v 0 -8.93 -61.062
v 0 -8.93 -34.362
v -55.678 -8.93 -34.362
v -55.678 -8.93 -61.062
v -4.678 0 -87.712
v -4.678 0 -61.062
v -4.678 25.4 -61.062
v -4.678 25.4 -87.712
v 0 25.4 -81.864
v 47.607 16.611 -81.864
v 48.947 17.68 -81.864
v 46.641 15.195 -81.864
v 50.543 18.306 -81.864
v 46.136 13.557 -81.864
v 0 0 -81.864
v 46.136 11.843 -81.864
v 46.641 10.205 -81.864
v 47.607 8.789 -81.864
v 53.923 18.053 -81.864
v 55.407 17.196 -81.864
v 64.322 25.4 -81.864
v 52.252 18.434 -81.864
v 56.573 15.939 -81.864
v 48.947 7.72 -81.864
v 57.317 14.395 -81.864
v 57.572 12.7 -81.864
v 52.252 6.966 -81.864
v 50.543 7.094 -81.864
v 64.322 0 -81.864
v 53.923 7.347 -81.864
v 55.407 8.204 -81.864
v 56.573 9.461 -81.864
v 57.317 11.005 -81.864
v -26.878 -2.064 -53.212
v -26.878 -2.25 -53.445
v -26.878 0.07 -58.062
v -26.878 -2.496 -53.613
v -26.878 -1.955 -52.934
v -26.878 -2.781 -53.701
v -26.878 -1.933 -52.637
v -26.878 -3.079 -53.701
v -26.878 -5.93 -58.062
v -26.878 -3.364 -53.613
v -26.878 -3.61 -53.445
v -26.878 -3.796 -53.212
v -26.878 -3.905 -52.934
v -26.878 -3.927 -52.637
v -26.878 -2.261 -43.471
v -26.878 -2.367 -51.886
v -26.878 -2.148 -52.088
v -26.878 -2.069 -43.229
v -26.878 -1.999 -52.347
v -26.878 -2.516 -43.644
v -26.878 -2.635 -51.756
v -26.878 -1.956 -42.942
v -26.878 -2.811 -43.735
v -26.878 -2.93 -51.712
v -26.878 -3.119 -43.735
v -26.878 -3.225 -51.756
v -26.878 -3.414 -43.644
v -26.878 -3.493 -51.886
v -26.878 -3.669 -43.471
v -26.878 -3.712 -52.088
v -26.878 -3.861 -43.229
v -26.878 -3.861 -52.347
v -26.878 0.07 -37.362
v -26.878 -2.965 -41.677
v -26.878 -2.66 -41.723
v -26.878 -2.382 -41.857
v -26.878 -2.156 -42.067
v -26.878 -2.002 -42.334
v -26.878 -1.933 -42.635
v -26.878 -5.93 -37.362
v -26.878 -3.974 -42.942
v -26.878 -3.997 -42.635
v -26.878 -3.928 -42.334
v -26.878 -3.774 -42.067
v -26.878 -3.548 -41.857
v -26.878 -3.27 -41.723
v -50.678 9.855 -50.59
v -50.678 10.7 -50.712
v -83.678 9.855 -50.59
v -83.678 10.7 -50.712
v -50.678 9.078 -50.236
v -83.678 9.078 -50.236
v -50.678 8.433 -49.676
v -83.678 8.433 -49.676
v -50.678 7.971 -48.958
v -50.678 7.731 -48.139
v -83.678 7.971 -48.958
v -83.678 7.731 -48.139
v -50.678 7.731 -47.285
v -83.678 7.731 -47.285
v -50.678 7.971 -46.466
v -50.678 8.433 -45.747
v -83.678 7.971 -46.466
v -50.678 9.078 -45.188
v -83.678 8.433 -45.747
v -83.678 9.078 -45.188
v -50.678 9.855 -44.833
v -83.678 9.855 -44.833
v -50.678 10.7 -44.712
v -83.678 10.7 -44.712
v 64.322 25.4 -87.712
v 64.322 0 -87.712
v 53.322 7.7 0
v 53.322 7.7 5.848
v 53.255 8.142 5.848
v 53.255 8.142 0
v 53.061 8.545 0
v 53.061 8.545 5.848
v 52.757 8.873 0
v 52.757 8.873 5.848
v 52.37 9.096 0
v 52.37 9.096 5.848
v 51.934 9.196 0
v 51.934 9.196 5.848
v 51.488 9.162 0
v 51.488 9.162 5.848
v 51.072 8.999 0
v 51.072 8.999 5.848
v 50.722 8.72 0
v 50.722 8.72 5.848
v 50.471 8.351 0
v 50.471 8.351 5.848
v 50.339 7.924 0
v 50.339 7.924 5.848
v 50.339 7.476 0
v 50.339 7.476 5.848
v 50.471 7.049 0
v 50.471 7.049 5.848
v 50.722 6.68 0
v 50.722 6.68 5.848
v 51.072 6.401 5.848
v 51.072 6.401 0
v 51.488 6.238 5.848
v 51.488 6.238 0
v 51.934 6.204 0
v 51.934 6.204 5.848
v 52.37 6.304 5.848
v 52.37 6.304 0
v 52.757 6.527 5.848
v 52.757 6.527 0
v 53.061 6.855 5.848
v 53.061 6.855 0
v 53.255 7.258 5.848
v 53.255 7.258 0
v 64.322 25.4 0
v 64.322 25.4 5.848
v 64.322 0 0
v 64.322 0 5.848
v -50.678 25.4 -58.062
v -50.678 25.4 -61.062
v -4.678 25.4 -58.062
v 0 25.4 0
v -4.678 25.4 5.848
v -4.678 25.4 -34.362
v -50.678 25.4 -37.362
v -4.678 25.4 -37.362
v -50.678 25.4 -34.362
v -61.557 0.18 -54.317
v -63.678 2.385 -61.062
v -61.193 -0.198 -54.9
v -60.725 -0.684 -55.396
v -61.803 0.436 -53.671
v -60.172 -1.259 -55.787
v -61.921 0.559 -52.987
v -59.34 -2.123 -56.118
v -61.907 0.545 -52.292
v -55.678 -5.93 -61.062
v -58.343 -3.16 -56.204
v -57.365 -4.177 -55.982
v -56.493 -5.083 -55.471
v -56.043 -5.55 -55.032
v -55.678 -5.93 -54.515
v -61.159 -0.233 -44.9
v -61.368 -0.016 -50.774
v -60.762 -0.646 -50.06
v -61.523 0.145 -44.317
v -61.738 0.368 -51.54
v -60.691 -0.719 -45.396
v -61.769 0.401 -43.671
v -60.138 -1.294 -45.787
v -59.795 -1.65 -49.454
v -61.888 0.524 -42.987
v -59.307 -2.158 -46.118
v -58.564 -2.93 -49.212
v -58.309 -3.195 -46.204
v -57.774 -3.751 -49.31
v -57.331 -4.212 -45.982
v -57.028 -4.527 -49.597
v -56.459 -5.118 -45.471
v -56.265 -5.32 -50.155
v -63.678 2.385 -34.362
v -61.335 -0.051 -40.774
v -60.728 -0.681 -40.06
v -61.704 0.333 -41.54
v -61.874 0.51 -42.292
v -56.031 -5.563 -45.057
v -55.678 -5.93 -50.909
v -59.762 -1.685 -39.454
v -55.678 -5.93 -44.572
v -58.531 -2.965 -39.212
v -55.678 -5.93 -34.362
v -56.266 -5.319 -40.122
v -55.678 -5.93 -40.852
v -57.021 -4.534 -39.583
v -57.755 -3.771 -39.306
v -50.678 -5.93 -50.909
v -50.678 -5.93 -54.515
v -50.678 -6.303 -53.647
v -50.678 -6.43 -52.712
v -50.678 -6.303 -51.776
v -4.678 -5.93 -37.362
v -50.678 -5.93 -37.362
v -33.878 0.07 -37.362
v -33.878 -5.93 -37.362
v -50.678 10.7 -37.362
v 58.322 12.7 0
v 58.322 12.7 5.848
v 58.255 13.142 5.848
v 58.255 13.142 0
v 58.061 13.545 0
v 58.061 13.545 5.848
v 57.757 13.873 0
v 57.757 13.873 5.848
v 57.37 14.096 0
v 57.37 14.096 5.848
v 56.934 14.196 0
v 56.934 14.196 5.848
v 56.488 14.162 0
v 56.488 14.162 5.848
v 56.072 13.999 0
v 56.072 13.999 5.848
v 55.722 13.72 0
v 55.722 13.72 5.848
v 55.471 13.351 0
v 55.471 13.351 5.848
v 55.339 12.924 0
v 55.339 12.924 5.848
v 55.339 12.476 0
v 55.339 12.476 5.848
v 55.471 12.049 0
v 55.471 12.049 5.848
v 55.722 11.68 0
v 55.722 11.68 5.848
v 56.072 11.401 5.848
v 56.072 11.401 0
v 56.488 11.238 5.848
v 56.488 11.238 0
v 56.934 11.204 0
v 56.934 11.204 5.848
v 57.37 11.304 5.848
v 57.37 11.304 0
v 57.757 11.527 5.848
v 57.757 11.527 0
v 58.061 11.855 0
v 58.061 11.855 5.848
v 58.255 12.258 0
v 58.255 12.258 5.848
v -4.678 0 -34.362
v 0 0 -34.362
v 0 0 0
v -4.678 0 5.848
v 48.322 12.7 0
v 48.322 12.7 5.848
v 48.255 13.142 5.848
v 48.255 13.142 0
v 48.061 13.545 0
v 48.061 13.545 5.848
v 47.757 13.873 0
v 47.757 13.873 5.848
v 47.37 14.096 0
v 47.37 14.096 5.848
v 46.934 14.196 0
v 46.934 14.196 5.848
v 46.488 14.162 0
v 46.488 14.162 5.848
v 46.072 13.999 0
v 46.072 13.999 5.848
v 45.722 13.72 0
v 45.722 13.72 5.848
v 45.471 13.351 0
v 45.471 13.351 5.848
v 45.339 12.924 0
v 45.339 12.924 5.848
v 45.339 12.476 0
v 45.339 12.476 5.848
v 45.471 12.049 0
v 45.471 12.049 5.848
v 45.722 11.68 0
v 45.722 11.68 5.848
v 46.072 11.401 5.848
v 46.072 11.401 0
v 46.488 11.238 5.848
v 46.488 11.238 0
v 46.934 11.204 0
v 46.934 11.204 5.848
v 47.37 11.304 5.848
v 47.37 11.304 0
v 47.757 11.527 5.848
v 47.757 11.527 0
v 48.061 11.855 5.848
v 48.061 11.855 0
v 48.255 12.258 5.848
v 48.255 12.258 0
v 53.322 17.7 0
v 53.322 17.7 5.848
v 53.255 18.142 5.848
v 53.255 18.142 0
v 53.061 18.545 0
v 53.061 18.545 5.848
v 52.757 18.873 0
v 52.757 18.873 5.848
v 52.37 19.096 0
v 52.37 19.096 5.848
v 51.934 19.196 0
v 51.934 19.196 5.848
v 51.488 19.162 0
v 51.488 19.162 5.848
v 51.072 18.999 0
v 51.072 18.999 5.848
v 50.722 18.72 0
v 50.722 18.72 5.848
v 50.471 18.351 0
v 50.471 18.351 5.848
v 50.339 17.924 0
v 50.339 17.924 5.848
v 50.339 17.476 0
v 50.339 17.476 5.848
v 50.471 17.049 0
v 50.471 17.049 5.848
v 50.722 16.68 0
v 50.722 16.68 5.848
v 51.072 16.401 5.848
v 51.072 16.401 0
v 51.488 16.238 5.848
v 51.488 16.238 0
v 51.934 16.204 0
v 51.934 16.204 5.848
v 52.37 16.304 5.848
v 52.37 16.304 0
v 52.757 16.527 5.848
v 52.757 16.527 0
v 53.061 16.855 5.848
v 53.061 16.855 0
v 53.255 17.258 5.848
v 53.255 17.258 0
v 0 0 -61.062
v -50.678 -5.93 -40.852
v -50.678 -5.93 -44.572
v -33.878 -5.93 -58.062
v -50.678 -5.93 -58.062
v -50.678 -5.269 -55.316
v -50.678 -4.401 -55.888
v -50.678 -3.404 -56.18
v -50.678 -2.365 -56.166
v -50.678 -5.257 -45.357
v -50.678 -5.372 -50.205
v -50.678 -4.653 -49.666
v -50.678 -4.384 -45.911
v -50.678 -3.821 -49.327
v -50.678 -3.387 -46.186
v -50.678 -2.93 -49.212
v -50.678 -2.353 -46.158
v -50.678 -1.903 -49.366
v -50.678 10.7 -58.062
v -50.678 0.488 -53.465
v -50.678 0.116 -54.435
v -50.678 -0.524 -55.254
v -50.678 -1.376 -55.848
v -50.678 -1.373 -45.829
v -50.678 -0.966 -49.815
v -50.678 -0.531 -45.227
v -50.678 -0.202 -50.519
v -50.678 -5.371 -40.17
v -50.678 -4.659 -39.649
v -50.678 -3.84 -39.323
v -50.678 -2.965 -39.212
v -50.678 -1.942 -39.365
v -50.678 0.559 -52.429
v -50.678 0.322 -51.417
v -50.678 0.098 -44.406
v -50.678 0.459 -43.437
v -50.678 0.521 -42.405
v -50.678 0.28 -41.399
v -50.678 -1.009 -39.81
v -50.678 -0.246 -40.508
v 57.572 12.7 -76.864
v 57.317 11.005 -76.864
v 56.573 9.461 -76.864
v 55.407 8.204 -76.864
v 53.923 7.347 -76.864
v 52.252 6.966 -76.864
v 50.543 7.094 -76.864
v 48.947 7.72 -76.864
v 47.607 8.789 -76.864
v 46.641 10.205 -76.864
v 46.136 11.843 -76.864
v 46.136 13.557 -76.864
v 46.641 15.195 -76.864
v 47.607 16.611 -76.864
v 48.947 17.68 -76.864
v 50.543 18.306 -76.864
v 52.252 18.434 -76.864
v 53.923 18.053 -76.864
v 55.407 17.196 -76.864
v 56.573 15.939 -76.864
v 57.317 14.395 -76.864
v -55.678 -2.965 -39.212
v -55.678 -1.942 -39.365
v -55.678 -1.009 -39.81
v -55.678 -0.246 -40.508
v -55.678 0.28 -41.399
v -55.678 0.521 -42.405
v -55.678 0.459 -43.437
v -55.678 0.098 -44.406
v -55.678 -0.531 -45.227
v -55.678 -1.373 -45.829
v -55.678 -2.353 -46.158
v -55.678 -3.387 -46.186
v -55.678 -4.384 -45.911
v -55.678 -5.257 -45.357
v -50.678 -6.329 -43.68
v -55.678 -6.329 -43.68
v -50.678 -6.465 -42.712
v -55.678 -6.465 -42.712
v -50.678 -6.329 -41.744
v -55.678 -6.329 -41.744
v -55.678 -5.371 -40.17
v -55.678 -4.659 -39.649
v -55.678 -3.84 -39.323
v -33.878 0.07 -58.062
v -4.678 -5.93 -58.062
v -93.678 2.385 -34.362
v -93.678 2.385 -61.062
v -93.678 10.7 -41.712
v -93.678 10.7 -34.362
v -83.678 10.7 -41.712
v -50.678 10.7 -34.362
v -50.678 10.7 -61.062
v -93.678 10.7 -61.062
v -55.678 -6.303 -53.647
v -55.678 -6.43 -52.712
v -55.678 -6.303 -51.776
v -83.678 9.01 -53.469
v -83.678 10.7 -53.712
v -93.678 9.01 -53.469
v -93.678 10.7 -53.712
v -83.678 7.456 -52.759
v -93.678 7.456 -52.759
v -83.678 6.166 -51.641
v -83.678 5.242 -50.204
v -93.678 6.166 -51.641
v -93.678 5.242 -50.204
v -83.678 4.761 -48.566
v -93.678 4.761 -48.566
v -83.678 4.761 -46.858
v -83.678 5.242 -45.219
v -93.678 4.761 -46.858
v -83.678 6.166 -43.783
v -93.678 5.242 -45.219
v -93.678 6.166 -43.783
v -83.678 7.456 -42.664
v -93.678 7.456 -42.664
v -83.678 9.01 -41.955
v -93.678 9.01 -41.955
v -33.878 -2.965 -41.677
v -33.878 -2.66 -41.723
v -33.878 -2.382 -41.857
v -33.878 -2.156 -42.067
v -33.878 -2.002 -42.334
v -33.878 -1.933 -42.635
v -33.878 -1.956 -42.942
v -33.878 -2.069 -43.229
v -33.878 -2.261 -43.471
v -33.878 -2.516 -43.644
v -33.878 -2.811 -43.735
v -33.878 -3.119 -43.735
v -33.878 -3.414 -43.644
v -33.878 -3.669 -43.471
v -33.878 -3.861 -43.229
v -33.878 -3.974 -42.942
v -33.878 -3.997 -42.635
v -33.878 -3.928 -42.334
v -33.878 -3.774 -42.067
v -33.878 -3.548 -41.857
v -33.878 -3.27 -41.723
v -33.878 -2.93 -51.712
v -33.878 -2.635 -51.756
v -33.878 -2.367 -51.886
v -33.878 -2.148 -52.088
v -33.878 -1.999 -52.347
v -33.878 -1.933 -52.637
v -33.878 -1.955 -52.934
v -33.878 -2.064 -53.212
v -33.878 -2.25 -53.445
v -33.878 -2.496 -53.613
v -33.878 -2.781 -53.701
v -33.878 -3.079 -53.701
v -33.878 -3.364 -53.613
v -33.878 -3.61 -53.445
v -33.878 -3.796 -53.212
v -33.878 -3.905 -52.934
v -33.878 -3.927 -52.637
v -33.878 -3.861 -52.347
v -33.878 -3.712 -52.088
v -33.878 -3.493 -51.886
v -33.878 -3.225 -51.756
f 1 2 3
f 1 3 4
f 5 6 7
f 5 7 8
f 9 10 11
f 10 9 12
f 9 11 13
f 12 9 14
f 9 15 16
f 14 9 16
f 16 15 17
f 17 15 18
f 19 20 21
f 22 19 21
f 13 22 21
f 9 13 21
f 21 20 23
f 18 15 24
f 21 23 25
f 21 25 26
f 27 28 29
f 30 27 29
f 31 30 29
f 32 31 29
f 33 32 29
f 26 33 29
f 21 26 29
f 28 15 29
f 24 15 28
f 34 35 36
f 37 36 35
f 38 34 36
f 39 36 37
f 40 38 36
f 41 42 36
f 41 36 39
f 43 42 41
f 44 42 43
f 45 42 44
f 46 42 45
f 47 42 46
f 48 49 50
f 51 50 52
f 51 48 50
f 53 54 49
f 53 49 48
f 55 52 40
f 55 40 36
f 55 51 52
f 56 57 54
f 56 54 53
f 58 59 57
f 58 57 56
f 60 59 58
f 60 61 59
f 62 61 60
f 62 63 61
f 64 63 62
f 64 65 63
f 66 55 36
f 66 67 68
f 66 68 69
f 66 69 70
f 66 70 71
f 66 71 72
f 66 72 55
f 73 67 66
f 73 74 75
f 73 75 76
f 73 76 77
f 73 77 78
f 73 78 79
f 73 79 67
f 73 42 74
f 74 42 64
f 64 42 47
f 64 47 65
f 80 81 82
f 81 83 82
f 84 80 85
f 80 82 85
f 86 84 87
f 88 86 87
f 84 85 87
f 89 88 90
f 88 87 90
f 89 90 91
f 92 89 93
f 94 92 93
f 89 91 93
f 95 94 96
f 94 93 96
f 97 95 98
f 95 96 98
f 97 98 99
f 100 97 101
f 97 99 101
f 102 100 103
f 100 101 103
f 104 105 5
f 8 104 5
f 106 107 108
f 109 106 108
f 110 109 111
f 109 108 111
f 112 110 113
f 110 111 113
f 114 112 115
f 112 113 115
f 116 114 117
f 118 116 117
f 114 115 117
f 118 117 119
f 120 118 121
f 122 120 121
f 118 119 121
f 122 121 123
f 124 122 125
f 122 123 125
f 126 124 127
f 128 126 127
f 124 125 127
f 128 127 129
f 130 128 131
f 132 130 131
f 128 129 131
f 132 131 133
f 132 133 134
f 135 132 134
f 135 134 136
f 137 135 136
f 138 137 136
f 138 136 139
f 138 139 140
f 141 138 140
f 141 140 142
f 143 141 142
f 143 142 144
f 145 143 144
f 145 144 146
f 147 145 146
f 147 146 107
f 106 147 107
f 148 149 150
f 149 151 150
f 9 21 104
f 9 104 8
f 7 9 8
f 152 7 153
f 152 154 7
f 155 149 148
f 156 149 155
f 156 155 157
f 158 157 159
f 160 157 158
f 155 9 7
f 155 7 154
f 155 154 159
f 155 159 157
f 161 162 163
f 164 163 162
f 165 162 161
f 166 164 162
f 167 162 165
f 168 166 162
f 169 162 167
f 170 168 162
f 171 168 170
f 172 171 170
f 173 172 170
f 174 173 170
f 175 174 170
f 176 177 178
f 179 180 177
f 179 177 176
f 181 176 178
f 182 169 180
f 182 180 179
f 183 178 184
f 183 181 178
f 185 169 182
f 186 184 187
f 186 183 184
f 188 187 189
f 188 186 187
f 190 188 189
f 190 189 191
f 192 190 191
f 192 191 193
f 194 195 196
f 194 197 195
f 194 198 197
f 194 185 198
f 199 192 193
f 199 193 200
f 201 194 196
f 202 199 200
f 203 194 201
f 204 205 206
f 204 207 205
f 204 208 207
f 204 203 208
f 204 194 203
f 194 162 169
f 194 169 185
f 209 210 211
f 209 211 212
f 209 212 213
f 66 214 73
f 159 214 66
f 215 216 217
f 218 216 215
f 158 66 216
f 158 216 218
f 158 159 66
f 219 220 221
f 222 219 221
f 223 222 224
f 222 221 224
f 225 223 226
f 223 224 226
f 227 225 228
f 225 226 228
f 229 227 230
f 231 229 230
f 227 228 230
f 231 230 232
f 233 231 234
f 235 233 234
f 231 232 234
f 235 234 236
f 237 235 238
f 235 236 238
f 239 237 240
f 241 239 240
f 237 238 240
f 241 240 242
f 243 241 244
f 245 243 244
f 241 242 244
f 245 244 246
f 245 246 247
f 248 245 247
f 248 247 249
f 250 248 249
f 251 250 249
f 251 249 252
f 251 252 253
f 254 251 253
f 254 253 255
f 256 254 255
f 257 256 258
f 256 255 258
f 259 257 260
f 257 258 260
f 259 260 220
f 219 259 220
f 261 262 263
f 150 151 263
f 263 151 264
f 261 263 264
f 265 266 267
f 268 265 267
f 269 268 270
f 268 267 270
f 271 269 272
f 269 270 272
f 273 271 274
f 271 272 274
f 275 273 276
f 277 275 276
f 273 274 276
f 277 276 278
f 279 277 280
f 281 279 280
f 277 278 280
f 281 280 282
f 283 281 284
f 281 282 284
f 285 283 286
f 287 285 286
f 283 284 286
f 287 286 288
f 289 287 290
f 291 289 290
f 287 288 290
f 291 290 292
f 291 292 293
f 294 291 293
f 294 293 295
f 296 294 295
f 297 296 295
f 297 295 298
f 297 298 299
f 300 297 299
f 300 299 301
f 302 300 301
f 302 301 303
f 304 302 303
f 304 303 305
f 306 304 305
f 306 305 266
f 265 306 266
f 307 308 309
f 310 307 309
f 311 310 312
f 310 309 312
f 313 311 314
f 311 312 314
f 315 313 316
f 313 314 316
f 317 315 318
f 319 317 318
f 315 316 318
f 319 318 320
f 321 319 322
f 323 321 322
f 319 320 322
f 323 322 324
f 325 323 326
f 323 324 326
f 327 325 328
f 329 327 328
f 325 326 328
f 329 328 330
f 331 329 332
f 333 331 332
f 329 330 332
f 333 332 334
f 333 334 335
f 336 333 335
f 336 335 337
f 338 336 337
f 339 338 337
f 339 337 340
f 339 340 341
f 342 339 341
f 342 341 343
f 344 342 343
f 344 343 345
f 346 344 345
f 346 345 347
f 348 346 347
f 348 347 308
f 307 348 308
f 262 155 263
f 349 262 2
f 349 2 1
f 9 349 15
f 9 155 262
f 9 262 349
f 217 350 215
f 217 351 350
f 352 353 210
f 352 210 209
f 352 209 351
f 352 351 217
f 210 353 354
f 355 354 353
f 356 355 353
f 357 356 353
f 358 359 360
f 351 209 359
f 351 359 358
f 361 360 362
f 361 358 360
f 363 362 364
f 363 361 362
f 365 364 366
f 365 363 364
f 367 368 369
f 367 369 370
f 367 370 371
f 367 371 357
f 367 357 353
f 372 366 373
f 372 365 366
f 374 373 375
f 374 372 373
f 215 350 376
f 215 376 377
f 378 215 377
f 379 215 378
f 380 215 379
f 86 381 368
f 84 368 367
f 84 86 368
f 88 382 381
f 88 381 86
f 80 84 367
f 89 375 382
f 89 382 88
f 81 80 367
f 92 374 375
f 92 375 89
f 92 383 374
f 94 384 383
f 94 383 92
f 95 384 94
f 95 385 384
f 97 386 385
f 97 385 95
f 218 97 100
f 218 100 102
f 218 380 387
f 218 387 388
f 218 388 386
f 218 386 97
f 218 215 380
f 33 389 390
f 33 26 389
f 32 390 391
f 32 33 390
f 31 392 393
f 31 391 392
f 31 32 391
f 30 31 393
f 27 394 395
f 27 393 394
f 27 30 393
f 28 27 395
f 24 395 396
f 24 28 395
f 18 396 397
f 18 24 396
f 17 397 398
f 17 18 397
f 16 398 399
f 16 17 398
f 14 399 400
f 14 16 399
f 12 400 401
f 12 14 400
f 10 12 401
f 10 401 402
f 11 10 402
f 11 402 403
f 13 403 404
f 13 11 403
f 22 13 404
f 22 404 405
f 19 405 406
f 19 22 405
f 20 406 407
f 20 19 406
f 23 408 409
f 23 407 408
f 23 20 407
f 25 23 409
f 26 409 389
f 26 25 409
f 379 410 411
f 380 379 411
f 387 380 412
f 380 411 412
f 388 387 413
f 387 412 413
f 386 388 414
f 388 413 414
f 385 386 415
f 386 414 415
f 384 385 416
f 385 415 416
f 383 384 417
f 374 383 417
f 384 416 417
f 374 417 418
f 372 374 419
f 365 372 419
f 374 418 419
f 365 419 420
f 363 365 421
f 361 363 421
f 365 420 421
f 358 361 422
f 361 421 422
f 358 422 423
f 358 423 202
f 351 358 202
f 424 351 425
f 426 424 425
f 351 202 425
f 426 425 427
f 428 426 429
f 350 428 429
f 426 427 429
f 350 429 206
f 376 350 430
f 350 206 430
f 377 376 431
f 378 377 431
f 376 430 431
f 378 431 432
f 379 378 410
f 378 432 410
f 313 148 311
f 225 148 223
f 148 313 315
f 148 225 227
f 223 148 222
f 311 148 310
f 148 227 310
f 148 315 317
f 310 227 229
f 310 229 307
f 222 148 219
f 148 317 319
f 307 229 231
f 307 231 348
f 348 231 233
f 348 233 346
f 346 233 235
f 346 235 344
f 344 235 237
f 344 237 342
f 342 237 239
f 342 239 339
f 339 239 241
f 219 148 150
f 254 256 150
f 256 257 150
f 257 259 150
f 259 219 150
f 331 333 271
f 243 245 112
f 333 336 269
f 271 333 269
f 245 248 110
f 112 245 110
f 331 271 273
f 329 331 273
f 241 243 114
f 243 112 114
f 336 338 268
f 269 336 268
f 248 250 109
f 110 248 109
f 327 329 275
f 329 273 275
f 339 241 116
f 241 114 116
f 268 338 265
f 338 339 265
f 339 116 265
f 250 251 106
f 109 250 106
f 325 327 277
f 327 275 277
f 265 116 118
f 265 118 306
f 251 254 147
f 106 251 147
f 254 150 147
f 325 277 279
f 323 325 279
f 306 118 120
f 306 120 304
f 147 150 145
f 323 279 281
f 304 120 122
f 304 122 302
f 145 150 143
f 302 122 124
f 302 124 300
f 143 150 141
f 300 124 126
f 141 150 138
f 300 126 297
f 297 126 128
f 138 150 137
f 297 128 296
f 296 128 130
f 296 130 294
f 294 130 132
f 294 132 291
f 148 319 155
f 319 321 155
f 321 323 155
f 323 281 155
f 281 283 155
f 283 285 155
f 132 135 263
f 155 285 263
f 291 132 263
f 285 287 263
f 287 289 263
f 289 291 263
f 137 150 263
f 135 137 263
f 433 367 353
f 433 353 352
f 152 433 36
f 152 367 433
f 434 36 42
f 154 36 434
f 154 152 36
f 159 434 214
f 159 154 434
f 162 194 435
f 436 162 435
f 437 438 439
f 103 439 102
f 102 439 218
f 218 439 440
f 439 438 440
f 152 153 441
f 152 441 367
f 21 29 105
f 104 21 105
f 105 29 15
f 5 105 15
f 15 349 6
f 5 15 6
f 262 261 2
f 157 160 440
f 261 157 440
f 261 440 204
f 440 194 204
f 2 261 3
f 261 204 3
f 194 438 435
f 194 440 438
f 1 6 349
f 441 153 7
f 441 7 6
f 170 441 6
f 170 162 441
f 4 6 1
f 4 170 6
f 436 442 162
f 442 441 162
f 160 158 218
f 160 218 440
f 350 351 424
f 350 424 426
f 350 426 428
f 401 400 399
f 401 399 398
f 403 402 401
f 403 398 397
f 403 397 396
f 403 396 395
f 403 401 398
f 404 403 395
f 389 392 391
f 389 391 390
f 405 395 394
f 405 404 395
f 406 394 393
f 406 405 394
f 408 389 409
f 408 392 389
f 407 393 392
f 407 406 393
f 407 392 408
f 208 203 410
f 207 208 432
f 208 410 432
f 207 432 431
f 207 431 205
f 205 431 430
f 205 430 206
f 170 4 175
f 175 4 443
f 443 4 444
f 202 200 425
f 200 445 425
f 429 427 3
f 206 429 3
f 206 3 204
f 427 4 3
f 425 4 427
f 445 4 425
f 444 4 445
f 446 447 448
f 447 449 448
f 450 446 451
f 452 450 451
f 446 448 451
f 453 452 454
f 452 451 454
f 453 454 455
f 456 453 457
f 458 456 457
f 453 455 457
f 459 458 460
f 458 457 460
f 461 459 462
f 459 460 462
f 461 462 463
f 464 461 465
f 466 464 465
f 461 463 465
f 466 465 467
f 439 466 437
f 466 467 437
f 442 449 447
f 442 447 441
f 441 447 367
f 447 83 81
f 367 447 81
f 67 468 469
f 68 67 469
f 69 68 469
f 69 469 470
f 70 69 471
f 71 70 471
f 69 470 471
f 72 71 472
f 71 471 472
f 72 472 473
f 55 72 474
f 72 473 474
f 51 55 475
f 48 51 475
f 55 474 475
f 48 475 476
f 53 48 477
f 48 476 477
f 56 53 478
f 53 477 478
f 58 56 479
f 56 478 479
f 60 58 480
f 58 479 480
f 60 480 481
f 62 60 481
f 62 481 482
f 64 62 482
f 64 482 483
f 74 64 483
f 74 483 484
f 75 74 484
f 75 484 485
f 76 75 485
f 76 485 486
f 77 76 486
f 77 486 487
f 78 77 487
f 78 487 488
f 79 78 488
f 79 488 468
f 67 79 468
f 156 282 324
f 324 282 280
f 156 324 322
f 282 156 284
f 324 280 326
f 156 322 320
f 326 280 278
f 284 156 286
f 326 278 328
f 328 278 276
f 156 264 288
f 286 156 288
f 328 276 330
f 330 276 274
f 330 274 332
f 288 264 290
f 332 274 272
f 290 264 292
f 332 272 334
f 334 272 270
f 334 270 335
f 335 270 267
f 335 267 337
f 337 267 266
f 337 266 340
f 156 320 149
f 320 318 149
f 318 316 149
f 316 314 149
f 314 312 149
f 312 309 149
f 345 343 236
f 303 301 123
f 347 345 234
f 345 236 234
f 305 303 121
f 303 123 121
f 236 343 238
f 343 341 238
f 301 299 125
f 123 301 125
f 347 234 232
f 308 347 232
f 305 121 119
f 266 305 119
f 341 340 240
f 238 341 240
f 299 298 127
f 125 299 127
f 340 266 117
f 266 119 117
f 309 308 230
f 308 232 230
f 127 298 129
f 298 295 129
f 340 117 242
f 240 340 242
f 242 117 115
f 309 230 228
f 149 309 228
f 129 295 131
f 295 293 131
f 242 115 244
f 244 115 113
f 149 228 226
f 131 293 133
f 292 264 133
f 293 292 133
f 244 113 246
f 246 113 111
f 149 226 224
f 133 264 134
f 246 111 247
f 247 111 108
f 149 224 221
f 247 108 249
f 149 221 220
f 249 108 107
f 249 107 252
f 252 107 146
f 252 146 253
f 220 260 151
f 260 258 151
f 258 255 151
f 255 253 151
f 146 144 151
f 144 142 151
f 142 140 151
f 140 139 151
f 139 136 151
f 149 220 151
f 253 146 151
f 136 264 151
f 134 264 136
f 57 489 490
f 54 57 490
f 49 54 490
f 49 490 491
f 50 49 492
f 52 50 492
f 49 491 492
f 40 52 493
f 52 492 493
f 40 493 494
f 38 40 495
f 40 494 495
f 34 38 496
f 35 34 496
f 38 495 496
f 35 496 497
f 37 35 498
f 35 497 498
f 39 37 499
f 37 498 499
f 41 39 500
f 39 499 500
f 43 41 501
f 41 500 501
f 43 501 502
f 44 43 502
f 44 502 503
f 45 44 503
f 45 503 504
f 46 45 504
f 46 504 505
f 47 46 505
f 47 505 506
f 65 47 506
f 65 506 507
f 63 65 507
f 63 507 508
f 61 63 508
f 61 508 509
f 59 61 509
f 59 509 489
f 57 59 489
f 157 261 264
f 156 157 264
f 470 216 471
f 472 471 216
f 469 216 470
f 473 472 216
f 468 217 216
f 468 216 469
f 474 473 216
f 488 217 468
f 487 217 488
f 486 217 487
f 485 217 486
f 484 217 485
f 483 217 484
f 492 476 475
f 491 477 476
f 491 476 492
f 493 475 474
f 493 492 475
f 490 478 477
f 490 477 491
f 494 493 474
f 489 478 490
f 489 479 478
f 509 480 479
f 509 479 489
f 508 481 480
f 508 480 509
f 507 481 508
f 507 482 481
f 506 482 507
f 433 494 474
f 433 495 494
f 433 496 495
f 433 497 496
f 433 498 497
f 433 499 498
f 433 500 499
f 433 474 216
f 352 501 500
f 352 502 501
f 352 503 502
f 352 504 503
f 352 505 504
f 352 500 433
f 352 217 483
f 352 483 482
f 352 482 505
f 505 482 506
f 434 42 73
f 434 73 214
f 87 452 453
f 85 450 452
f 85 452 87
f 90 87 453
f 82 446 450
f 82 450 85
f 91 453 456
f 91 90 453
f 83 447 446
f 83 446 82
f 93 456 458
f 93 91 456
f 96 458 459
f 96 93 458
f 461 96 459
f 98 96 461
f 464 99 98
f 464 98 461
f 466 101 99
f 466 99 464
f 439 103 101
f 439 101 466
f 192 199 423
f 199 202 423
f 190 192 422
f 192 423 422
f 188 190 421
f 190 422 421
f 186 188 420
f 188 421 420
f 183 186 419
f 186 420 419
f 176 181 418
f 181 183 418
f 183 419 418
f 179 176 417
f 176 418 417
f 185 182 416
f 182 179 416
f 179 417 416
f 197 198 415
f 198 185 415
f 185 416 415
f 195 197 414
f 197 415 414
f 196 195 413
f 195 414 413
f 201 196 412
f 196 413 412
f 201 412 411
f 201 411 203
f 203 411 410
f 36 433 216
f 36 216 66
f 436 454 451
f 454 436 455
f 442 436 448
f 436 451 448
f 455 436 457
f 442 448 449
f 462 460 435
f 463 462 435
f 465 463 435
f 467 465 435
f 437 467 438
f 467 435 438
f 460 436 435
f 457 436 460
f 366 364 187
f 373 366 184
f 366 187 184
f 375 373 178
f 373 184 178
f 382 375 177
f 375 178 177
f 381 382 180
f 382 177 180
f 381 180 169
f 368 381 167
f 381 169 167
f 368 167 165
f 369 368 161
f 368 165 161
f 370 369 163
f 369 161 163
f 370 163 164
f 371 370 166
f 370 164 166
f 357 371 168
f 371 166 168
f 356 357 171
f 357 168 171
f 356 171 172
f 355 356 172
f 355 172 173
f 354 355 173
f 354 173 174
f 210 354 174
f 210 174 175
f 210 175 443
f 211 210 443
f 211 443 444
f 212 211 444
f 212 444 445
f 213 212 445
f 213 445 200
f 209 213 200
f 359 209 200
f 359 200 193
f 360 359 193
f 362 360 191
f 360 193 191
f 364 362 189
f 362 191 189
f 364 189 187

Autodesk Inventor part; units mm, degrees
ref_plane "YZ Plane" through (0, 0, 0) normal (1, 0, 0) x (0, 1, 0)
ref_plane "XZ Plane" through (0, 0, 0) normal (0, 1, 0) x (-1, 0, 0)
ref_plane "XY Plane" through (0, 0, 0) normal (0, 0, 1) x (1, 0, 0)
sketch "Sketch1" plane through (0, 0, 0) normal (0, 1, 0) x (-1, 0, 0)
  line L0 (0, 0) -> (0, -81.8644)
  line L1 (4.678, -40.9322) -> (4.678, 5.8475)
  line L2 (4.678, -40.9322) -> (4.678, -87.7119)
  line L3 (4.678, 5.8475) -> (-64.322, 5.8475)
  line L4 (-64.322, 5.8475) -> (-64.322, 0)
  line L5 (-64.322, 0) -> (0, 0)
  line L6 (0, -81.8644) -> (-64.322, -81.8644)
  line L7 (-64.322, -81.8644) -> (-64.322, -87.7119)
  line L8 (-64.322, -87.7119) -> (4.678, -87.7119)
  dimension "d4" = 69
extrude "Extrusion1" add sketch "Sketch1" along normal blind 25.4
sketch "Sketch2" plane through (-4.678, 0, -87.7119) normal (-1, 0, 0) x (0, 0, 1)
  line L0 (87.7119, 25.4) -> (5.8475, 25.4) projected
  line L1 (87.7119, 0) -> (5.8475, 0) projected
  line L2 (40, -8.93) -> (50.35, -8.93)
  line L3 (50.35, -8.93) -> (53.35, -8.93)
  line L4 (40, -8.93) -> (29.65, -8.93)
  line L5 (29.65, -8.93) -> (26.65, -8.93)
  line L6 (53.35, -8.93) -> (53.35, 25.4)
  line L7 (26.65, -8.93) -> (26.65, 25.4)
  line L8 (26.65, 25.4) -> (53.35, 25.4)
  dimension "d19" = 3
  dimension "d20" = 10.35
  dimension "d26" = 34.33
extrude "Extrusion2" add sketch "Sketch2" along normal blind 46
sketch "Sketch3" plane through (0, 25.4, 0) normal (0, 1, 0) x (1, 0, 0)
  line L0 (-50.678, 34.3619) -> (-50.678, 61.0619) projected
  line L1 (-50.678, 47.7119) -> (-50.678, 58.0619)
  line L2 (-50.678, 47.7119) -> (-50.678, 37.3619)
  line L3 (-50.678, 58.0619) -> (-4.678, 58.0619)
  line L4 (-4.678, 61.0619) -> (-4.678, 34.3619) projected
  line L5 (-4.678, 58.0619) -> (-4.678, 37.3619)
  line L6 (-4.678, 37.3619) -> (-50.678, 37.3619)
  point P0 (0, 0)
  dimension "d24" = 10.35
  dimension "d25" = 10.35
extrude "Extrusion3" cut sketch "Sketch3" against normal blind 31.33
sketch "Sketch4" plane through (0, -5.93, 0) normal (0, 1, 0) x (1, 0, 0)
  line L0 (-50.678, 61.0619) -> (-50.678, 34.3619) projected
  line L1 (-33.878, 47.7119) -> (-33.878, 58.0619)
  line L2 (-50.678, 58.0619) -> (-4.678, 58.0619) projected
  line L3 (-33.878, 58.0619) -> (-26.878, 58.0619)
  line L4 (-26.878, 58.0619) -> (-26.878, 37.3619)
  line L5 (-4.678, 37.3619) -> (-50.678, 37.3619) projected
  line L6 (-26.878, 37.3619) -> (-33.878, 37.3619)
  line L7 (-33.878, 37.3619) -> (-33.878, 47.7119)
  point P0 (0, 0)
  dimension "d30" = 7
extrude "Extrusion4" add sketch "Sketch4" along normal blind 6 contours L2 L4 L5 L7 L1
sketch "Sketch5" plane through (-33.878, -5.93, -58.0619) normal (-1, 0, 0) x (0, 0, 1)
  line L0 (20.7, 0) -> (20.7, 5.93) projected
  line L1 (0, 6) -> (0, 0) projected
  circle A0 centre (5.35, 3) radius 1
  circle A1 centre (15.35, 2.965) radius 1.035
  point P0 (58.0619, 5.93)
  dimension "d35" = 2
extrude "Extrusion5" cut sketch "Sketch5" against normal through all
sketch "Sketch6" plane through (-4.678, -8.93, -34.3619) normal (0, 0, 1) x (1, 0, 0)
  line L0 (-29.2, 3) -> (-46, 3) projected
  line L1 (0, 0) -> (-46, 0) projected
  line L2 (-46, 0) -> (-51, 0)
  line L3 (-51, 0) -> (-51, 3)
  line L4 (-59, 11.315) -> (-51, 3)
  line L5 (-51, 19.63) -> (-46, 19.63)
  line L6 (-46, 0) -> (-46, 34.33) projected
  line L7 (69, 8.93) -> (69, 34.33) projected
  line L8 (-59, 11.315) -> (-89, 11.315)
  line L9 (-89, 11.315) -> (-89, 19.63)
  line L10 (-89, 19.63) -> (-51, 19.63)
  point P0 (4.678, 8.93)
  dimension "d41" = 5
  dimension "d42" = 16.63
  dimension "d46" = 30
extrude "Extrusion6" add sketch "Sketch6" against normal up to surface (26.7 mm away)
sketch "Sketch7" plane through (-93.678, 2.385, -34.3619) normal (-1, 0, 0) x (0, 0, 1)
  line L0 (-3, 8.315) -> (-23.7, 8.315) projected
  circle A0 centre (-13.35, 8.315) radius 3
  point P0 (34.3619, -2.385)
  point P1 (-16.35, 8.315)
  point P2 (-10.35, 8.315)
  dimension "d49" = 6
extrude "Extrusion7" cut sketch "Sketch7" against normal up to surface (43 mm away) contours A0 L0 picked at (-13.9181, 7.492)
sketch "Sketch8" plane through (-93.678, 2.385, -34.3619) normal (-1, 0, 0) x (0, 0, 1)
  arc A0 (-16.35, 8.315) -> (-10.35, 8.315) centre (-13.35, 8.315) ccw projected
  circle A1 centre (-13.35, 8.315) radius 6
  point P0 (34.3619, -2.385)
  dimension "d52" = 12
extrude "Extrusion8" cut sketch "Sketch8" against normal blind 10
sketch "Sketch9" plane through (-55.678, -8.93, -34.3619) normal (-1, 0, 0) x (0, 0, 1)
  circle A0 centre (-8.35, 5.965) radius 3.5
  circle A1 centre (-18.35, 6) radius 1 projected
  circle A2 centre (-18.35, 6) radius 3.5
  point P0 (34.3619, 8.93)
  dimension "d55" = 7
  dimension "d56" = 7
extrude "Extrusion9" cut sketch "Sketch9" along normal blind 7 and the other way blind 5 contours A0 | A1 | A2
sketch "Sketch10" plane through (-4.678, 0, -87.7119) normal (1, 0, 0) x (0, 0, -1)
  line L0 (-53.35, -5.93) -> (-53.35, -8.93) projected
  line L1 (-50.35, 10.7) -> (-50.35, -5.93) projected
  line L2 (-53.35, -8.93) -> (-50.35, -8.93)
  line L3 (-50.35, -5.93) -> (-50.35, 0)
  line L4 (-50.35, 0) -> (-53.35, 0)
  line L5 (-53.35, 0) -> (-53.35, -8.93)
  line L6 (-26.65, -5.93) -> (-26.65, -8.93) projected
  line L7 (-29.65, -5.93) -> (-29.65, 10.7) projected
  line L8 (-26.65, -8.93) -> (-29.65, -8.93)
  line L9 (-29.65, -5.93) -> (-29.65, 0)
  line L10 (-29.65, 0) -> (-26.65, 0)
  line L11 (-26.65, 0) -> (-26.65, -8.93)
  line L12 (-29.65, -8.93) -> (-50.35, -8.93)
  line L13 (-50.35, 0) -> (-29.65, 0)
  line L14 (-29.65, 0) -> (-29.65, -5.93)
  line L15 (-50.35, -5.93) -> (-50.35, 0)
  point P0 (-87.7119, 0)
extrude "Extrusion10" add sketch "Sketch10" along normal up to surface (4.678 mm away)
sketch "Sketch13" plane through (0, 0, -81.8644) normal (0, 0, 1) x (1, 0, 0)
  line L0 (64.322, 0) -> (64.322, 25.4) projected
  circle A0 centre (51.822, 12.7) radius 5.75
  point P0 (0, 0)
  dimension "d76" = 11.5
extrude "Extrusion13" add sketch "Sketch13" along normal blind 5
sketch "Sketch14" plane through (-4.678, 0, 5.8475) normal (0, 0, 1) x (1, 0, 0)
  line L0 (69, 0) -> (69, 25.4) projected
  circle A0 centre (56.5, 12.7) radius 5.75 projected
  circle A1 centre (56.5, 17.7) radius 1.5
  circle A2 centre (51.5, 12.7) radius 1.5
  circle A3 centre (56.5, 7.7) radius 1.5
  circle A4 centre (61.5, 12.7) radius 1.5
  point P0 (4.678, 0)
  dimension "d80" = 3
  dimension "d83" = 360
extrude "Extrusion14" cut sketch "Sketch14" against normal up to surface (5.8475 mm away) contours A0 A4 | A0 A4 | A1 A0 | A0 A1 | A3 A0 | A0 A3 | A2 A0 | A0 A2
ref_plane "Work Plane6" through (-60.678, -5.93, -58.0619) normal (1, 0, 0) x (0, 0, -1)
properties part number "Joint2"
